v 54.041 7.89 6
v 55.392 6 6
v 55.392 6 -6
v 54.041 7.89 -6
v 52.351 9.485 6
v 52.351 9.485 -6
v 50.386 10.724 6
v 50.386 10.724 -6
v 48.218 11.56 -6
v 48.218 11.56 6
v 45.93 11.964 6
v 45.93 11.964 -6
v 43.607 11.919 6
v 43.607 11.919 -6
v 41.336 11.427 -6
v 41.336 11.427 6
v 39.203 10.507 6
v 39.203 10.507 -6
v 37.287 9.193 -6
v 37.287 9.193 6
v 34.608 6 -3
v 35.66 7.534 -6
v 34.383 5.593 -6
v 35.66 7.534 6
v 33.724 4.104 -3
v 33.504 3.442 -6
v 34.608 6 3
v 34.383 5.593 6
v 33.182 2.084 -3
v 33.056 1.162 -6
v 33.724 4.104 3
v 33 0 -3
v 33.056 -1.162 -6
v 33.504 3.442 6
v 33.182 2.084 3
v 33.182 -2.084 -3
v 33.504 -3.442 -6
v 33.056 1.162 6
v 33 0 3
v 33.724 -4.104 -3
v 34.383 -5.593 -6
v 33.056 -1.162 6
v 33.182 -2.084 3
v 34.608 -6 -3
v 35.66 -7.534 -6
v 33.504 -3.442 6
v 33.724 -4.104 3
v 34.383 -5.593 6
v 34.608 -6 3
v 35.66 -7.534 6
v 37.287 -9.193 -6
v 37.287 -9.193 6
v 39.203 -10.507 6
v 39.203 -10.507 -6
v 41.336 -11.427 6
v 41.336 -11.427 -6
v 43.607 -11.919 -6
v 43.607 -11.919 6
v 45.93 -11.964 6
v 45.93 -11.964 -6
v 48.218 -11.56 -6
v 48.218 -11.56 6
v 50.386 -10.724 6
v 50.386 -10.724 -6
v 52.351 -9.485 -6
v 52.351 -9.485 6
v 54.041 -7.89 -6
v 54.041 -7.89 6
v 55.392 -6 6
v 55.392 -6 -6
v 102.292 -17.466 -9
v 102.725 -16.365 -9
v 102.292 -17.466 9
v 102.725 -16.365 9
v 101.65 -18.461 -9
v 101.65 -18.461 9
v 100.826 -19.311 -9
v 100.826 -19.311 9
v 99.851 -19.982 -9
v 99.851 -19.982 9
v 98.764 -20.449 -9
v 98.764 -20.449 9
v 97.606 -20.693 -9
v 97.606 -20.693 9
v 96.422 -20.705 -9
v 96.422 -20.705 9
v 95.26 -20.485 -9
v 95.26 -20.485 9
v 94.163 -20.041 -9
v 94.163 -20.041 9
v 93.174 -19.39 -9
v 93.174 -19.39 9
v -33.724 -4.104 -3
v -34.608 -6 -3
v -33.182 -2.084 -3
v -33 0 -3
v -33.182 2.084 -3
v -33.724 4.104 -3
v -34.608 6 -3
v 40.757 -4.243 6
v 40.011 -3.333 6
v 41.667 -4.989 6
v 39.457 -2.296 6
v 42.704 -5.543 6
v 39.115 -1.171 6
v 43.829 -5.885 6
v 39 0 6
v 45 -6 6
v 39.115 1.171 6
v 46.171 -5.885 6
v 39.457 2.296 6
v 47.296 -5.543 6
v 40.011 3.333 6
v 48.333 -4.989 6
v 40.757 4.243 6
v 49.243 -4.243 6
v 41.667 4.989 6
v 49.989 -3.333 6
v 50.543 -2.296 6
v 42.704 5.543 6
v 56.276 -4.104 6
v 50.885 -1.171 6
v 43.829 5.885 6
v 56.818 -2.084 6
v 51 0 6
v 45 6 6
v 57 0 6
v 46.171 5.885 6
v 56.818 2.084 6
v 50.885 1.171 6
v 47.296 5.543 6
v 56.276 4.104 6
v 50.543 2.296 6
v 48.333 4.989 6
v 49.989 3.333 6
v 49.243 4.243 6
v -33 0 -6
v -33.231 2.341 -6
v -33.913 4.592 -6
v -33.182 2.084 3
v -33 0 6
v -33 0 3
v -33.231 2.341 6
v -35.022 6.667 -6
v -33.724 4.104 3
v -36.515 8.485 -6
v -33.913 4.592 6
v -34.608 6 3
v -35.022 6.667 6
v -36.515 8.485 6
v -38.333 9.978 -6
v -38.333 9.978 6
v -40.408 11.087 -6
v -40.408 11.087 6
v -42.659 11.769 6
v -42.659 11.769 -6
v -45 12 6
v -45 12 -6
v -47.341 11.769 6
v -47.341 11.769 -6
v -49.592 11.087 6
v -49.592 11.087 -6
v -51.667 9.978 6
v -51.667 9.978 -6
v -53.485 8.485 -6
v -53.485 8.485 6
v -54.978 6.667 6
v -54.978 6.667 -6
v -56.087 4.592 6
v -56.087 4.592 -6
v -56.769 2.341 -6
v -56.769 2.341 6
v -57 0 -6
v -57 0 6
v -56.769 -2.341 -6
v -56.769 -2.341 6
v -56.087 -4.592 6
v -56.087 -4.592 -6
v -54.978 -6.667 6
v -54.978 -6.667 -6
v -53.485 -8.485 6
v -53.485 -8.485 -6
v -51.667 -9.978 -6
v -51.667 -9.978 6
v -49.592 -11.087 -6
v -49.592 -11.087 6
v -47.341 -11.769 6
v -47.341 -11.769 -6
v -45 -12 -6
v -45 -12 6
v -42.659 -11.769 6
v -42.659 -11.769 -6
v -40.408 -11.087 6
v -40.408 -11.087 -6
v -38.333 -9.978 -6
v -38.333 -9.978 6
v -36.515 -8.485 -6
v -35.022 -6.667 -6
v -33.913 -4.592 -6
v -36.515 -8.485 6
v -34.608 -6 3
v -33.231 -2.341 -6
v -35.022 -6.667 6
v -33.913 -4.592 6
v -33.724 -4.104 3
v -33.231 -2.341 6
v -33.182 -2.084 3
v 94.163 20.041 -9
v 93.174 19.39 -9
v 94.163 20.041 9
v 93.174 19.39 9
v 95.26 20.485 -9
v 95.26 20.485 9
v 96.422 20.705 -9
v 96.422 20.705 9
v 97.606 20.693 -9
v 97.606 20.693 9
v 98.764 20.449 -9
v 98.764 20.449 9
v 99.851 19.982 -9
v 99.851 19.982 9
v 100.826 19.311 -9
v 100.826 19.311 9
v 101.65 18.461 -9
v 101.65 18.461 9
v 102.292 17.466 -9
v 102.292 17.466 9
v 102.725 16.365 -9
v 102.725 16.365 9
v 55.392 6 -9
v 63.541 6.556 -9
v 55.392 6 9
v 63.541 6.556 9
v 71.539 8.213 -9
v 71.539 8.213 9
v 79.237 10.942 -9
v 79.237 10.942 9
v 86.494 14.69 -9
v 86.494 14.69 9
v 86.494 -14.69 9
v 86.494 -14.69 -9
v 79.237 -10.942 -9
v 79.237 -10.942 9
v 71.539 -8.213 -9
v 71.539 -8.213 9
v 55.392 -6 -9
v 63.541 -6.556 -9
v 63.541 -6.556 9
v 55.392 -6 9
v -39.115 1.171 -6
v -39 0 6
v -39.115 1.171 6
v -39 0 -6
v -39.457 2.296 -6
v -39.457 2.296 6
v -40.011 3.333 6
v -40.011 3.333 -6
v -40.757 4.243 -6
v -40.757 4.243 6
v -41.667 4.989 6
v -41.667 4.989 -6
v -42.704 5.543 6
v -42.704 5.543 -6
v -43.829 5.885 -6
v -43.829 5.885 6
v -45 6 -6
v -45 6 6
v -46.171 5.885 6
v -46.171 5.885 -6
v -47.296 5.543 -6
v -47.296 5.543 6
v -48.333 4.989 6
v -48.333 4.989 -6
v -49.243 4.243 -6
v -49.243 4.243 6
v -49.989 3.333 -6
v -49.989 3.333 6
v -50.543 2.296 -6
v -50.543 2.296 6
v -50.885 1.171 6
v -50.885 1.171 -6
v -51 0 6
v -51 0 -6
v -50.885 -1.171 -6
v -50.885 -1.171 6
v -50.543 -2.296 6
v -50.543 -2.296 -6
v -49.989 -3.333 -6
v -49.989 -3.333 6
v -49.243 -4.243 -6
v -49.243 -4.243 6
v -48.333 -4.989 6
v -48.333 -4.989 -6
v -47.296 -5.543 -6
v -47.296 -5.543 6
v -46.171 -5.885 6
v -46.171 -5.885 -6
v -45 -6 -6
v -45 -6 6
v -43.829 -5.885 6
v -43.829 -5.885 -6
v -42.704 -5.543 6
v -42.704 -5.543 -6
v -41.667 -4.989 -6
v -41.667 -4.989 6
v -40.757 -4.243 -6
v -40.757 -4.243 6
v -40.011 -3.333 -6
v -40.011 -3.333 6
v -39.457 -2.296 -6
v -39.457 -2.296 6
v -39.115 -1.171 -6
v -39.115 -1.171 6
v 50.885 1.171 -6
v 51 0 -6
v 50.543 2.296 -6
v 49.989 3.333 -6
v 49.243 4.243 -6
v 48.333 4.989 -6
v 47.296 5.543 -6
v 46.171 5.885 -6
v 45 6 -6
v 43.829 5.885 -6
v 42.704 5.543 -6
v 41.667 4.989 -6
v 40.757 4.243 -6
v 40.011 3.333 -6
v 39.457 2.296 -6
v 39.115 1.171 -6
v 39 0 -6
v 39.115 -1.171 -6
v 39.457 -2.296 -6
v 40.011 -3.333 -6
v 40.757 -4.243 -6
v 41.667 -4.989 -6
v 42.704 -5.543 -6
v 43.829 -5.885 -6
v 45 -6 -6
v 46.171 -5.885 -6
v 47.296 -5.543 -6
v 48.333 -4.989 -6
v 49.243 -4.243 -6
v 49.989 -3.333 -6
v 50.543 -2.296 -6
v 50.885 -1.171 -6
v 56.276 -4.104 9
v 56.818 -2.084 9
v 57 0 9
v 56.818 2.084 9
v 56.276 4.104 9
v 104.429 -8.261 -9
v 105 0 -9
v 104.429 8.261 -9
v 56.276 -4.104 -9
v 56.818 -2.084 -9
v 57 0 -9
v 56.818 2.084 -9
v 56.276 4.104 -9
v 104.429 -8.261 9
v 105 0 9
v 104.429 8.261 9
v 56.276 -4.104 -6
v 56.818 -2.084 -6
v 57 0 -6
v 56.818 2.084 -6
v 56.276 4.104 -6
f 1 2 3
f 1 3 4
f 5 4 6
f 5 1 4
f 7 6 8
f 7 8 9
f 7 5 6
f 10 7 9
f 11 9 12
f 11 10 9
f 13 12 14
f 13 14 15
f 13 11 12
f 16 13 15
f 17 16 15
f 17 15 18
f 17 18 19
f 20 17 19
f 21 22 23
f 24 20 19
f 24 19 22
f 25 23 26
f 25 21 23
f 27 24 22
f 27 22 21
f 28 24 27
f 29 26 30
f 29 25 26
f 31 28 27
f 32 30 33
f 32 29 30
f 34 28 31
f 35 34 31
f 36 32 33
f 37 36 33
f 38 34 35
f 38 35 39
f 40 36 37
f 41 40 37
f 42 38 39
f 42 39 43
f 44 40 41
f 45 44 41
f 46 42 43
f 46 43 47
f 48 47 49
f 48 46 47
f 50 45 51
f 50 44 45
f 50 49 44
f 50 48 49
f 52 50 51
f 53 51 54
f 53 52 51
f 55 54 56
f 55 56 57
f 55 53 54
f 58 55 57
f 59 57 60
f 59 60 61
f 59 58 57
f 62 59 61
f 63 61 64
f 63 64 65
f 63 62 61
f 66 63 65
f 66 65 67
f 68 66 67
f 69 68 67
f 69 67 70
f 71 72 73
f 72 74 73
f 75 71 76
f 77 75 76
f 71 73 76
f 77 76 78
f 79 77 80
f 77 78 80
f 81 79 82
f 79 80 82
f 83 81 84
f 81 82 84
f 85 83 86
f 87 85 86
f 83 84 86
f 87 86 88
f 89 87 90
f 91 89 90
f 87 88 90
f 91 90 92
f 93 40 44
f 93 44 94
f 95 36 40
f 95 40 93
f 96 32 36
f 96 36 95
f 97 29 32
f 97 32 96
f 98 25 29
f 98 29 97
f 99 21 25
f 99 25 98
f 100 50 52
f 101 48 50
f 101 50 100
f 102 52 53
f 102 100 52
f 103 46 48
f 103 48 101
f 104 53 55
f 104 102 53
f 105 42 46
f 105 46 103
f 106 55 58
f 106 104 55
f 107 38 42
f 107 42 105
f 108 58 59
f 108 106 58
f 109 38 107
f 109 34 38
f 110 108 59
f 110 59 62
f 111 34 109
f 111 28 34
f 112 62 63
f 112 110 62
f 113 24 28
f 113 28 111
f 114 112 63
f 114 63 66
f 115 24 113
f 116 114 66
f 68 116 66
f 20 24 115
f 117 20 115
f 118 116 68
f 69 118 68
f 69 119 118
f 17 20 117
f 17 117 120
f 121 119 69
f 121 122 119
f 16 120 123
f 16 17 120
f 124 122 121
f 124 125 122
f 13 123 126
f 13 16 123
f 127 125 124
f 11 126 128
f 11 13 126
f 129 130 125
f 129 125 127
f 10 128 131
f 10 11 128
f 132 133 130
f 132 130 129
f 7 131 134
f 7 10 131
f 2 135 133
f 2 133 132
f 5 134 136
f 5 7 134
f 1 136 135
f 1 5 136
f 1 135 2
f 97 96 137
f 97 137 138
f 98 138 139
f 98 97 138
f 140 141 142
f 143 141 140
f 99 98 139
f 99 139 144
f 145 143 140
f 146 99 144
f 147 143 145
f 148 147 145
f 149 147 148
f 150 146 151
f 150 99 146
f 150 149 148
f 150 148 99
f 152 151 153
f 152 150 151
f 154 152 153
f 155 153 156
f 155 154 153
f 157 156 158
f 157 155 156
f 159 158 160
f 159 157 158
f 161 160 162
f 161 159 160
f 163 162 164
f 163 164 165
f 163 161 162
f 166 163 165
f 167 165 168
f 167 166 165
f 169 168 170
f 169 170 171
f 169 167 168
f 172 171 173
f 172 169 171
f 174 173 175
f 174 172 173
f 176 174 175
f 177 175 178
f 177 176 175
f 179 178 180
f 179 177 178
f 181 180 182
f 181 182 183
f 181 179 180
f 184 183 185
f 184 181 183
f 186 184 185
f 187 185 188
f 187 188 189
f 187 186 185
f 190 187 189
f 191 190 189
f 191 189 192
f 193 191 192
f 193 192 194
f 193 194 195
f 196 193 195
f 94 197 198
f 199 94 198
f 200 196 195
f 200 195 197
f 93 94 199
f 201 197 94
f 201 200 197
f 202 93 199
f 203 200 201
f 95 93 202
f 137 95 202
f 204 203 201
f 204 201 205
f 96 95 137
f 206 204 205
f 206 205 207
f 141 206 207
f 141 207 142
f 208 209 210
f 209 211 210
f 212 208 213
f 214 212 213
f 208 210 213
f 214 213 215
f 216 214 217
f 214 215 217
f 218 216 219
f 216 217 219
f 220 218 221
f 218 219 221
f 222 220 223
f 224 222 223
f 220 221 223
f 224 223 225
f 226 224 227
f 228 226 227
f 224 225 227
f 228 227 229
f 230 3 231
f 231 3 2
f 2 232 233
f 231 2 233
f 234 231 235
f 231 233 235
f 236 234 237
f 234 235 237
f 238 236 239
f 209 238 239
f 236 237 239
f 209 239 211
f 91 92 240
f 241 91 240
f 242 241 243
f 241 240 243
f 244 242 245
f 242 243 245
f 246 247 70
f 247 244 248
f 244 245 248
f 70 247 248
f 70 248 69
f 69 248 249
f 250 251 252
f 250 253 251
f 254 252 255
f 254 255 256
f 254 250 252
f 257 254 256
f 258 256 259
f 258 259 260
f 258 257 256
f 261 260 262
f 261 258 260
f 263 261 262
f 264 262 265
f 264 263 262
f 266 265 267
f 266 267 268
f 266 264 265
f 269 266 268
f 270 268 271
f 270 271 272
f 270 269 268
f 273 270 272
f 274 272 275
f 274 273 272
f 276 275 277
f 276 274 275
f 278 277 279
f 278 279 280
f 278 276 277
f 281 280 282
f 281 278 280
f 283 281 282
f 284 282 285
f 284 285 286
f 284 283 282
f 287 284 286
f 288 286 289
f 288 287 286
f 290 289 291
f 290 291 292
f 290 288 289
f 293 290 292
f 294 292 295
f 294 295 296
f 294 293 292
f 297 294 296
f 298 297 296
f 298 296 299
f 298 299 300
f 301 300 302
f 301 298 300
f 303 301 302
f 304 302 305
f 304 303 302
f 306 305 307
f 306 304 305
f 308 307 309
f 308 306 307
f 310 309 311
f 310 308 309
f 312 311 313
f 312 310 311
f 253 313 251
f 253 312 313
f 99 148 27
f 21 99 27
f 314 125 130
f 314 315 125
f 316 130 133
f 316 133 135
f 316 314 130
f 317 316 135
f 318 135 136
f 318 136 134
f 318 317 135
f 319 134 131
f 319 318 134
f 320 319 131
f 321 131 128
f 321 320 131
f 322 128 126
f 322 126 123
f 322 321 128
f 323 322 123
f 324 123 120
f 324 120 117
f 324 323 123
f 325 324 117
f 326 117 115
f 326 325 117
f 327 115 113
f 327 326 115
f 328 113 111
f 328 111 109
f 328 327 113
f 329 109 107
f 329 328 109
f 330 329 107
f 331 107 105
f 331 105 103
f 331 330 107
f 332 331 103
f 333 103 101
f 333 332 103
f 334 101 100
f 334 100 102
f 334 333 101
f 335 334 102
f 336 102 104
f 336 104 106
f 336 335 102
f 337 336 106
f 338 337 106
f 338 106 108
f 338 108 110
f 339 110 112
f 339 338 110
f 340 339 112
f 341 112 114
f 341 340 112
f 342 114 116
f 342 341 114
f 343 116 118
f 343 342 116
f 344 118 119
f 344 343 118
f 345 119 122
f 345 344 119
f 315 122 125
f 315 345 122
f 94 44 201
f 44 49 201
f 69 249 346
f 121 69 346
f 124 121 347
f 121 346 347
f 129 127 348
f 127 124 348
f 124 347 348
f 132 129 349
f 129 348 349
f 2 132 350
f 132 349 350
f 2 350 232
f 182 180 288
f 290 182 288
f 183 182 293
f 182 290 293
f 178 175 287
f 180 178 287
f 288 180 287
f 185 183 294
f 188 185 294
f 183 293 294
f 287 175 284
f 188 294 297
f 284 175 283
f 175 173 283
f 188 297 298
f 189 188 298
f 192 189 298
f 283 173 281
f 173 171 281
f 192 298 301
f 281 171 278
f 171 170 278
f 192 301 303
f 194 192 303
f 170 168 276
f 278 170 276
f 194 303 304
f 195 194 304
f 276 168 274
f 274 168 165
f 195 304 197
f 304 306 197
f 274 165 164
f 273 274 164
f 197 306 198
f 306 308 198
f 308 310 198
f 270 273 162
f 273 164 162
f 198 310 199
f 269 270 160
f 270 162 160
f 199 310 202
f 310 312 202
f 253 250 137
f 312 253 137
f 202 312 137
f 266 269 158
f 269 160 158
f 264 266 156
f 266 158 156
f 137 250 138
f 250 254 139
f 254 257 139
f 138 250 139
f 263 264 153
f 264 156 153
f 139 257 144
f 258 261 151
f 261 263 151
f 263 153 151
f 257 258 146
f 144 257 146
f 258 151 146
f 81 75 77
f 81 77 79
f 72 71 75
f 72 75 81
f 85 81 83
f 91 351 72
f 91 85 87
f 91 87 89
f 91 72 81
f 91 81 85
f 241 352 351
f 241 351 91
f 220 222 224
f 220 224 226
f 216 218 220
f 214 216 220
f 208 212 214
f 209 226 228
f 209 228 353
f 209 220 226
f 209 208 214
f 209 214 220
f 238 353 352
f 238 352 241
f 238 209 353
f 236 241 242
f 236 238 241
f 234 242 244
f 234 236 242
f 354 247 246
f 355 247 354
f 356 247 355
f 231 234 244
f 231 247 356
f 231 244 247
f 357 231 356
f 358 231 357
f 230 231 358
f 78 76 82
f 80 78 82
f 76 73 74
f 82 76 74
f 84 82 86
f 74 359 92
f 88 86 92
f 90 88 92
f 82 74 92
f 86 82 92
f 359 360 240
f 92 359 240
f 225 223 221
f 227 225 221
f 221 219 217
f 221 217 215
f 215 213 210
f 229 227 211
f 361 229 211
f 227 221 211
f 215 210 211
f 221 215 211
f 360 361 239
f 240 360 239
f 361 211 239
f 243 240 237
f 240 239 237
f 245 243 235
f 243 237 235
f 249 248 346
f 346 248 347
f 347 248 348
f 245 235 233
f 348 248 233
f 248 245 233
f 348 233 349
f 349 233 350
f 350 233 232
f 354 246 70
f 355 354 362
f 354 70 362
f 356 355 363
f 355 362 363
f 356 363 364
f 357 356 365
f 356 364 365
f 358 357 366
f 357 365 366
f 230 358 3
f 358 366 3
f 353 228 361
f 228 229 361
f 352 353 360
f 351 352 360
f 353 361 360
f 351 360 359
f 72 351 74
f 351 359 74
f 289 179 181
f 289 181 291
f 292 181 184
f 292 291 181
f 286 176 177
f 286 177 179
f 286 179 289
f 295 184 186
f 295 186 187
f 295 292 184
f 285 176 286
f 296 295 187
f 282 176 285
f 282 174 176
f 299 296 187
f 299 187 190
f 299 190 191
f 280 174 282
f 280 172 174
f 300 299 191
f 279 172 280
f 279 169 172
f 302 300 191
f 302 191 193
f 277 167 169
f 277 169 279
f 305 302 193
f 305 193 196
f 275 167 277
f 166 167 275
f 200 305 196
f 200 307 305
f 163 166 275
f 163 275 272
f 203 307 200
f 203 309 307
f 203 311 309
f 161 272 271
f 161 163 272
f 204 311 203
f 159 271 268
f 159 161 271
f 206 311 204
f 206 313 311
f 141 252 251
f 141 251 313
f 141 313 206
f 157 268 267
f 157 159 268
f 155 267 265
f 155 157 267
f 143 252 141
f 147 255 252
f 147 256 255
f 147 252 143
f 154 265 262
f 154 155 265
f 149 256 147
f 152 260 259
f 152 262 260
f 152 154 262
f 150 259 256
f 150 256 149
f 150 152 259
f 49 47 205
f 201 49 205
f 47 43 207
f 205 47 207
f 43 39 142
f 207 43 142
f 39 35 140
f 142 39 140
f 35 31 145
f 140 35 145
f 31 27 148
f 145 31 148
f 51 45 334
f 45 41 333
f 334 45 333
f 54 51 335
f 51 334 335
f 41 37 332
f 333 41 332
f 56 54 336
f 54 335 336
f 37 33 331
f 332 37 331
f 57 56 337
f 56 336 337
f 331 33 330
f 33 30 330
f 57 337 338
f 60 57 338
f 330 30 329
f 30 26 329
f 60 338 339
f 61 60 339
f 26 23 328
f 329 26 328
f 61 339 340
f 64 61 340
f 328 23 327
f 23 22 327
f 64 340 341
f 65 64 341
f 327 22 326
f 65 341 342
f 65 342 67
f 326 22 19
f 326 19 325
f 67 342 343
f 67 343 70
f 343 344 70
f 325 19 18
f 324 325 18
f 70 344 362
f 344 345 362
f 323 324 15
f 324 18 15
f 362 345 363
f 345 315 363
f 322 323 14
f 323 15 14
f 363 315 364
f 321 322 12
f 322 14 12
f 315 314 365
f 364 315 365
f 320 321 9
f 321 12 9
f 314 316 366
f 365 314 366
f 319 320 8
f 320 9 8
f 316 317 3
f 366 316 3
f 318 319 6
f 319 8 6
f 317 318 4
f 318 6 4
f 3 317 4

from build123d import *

# Parameters (mm, degrees)
SKETCH1_R             = 12
SKETCH1_R_2           = 6
BOSS_EXTRUDE1_DEPTH   = 6
BOSS_EXTRUDE1_2_DEPTH = 6
BOSS_EXTRUDE2_DEPTH   = 3
BOSS_EXTRUDE3_DEPTH   = 9


with BuildPart() as part:
    # Sketch1 → Boss-Extrude1 (new, symmetric)
    with BuildSketch(Plane.XY):
        with Locations((-45, 0)):
            Circle(SKETCH1_R)
        with Locations((-45, 0)):
            Circle(SKETCH1_R_2, mode=Mode.SUBTRACT)
    extrude(amount=BOSS_EXTRUDE1_DEPTH, both=True)



with BuildPart() as body_2:
    # Sketch1 → Boss-Extrude1 2 (new, symmetric)
    with BuildSketch(Plane.XY):
        with Locations((45, 0)):
            Circle(SKETCH1_R)
        with Locations((45, 0)):
            Circle(SKETCH1_R_2, mode=Mode.SUBTRACT)
    extrude(amount=BOSS_EXTRUDE1_2_DEPTH, both=True)


with BuildPart() as part_1:
    add(part.part)

    add(body_2.part)  # Boss-Extrude2 merges body 2
    # Sketch3 → Boss-Extrude2 (add, symmetric)
    with BuildSketch(Plane.XY):
        with BuildLine():
            Line((-34.607695155, 6), (34.607695155, 6))
            ThreePointArc((34.607695155, 6), (33, 0), (34.607695155, -6))
            Line((34.607695155, -6), (-34.607695155, -6))
            ThreePointArc((-34.607695155, -6), (-33, 0), (-34.607695155, 6))
        make_face()
    extrude(amount=BOSS_EXTRUDE2_DEPTH, both=True)

    # Sketch4 → Boss-Extrude3 (add, symmetric)
    with BuildSketch(Plane.XY):
        with BuildLine():
            ThreePointArc((55.392304845, 6), (75.434547778, 9.446410386), (93.174330904, 19.389716726))
            ThreePointArc((93.174330904, 19.389716726), (98.763947455, 20.448721573), (102.725037233, 16.365209331))
            ThreePointArc((102.725037233, 16.365209331), (105, 0), (102.725037233, -16.365209331))
            ThreePointArc((102.725037233, -16.365209331), (98.763947455, -20.448721573), (93.174330904, -19.389716726))
            ThreePointArc((93.174330904, -19.389716726), (75.434547778, -9.446410386), (55.392304845, -6))
            ThreePointArc((55.392304845, -6), (57, 0), (55.392304845, 6))
        make_face()
    extrude(amount=BOSS_EXTRUDE3_DEPTH, both=True)


solid = part_1.part
